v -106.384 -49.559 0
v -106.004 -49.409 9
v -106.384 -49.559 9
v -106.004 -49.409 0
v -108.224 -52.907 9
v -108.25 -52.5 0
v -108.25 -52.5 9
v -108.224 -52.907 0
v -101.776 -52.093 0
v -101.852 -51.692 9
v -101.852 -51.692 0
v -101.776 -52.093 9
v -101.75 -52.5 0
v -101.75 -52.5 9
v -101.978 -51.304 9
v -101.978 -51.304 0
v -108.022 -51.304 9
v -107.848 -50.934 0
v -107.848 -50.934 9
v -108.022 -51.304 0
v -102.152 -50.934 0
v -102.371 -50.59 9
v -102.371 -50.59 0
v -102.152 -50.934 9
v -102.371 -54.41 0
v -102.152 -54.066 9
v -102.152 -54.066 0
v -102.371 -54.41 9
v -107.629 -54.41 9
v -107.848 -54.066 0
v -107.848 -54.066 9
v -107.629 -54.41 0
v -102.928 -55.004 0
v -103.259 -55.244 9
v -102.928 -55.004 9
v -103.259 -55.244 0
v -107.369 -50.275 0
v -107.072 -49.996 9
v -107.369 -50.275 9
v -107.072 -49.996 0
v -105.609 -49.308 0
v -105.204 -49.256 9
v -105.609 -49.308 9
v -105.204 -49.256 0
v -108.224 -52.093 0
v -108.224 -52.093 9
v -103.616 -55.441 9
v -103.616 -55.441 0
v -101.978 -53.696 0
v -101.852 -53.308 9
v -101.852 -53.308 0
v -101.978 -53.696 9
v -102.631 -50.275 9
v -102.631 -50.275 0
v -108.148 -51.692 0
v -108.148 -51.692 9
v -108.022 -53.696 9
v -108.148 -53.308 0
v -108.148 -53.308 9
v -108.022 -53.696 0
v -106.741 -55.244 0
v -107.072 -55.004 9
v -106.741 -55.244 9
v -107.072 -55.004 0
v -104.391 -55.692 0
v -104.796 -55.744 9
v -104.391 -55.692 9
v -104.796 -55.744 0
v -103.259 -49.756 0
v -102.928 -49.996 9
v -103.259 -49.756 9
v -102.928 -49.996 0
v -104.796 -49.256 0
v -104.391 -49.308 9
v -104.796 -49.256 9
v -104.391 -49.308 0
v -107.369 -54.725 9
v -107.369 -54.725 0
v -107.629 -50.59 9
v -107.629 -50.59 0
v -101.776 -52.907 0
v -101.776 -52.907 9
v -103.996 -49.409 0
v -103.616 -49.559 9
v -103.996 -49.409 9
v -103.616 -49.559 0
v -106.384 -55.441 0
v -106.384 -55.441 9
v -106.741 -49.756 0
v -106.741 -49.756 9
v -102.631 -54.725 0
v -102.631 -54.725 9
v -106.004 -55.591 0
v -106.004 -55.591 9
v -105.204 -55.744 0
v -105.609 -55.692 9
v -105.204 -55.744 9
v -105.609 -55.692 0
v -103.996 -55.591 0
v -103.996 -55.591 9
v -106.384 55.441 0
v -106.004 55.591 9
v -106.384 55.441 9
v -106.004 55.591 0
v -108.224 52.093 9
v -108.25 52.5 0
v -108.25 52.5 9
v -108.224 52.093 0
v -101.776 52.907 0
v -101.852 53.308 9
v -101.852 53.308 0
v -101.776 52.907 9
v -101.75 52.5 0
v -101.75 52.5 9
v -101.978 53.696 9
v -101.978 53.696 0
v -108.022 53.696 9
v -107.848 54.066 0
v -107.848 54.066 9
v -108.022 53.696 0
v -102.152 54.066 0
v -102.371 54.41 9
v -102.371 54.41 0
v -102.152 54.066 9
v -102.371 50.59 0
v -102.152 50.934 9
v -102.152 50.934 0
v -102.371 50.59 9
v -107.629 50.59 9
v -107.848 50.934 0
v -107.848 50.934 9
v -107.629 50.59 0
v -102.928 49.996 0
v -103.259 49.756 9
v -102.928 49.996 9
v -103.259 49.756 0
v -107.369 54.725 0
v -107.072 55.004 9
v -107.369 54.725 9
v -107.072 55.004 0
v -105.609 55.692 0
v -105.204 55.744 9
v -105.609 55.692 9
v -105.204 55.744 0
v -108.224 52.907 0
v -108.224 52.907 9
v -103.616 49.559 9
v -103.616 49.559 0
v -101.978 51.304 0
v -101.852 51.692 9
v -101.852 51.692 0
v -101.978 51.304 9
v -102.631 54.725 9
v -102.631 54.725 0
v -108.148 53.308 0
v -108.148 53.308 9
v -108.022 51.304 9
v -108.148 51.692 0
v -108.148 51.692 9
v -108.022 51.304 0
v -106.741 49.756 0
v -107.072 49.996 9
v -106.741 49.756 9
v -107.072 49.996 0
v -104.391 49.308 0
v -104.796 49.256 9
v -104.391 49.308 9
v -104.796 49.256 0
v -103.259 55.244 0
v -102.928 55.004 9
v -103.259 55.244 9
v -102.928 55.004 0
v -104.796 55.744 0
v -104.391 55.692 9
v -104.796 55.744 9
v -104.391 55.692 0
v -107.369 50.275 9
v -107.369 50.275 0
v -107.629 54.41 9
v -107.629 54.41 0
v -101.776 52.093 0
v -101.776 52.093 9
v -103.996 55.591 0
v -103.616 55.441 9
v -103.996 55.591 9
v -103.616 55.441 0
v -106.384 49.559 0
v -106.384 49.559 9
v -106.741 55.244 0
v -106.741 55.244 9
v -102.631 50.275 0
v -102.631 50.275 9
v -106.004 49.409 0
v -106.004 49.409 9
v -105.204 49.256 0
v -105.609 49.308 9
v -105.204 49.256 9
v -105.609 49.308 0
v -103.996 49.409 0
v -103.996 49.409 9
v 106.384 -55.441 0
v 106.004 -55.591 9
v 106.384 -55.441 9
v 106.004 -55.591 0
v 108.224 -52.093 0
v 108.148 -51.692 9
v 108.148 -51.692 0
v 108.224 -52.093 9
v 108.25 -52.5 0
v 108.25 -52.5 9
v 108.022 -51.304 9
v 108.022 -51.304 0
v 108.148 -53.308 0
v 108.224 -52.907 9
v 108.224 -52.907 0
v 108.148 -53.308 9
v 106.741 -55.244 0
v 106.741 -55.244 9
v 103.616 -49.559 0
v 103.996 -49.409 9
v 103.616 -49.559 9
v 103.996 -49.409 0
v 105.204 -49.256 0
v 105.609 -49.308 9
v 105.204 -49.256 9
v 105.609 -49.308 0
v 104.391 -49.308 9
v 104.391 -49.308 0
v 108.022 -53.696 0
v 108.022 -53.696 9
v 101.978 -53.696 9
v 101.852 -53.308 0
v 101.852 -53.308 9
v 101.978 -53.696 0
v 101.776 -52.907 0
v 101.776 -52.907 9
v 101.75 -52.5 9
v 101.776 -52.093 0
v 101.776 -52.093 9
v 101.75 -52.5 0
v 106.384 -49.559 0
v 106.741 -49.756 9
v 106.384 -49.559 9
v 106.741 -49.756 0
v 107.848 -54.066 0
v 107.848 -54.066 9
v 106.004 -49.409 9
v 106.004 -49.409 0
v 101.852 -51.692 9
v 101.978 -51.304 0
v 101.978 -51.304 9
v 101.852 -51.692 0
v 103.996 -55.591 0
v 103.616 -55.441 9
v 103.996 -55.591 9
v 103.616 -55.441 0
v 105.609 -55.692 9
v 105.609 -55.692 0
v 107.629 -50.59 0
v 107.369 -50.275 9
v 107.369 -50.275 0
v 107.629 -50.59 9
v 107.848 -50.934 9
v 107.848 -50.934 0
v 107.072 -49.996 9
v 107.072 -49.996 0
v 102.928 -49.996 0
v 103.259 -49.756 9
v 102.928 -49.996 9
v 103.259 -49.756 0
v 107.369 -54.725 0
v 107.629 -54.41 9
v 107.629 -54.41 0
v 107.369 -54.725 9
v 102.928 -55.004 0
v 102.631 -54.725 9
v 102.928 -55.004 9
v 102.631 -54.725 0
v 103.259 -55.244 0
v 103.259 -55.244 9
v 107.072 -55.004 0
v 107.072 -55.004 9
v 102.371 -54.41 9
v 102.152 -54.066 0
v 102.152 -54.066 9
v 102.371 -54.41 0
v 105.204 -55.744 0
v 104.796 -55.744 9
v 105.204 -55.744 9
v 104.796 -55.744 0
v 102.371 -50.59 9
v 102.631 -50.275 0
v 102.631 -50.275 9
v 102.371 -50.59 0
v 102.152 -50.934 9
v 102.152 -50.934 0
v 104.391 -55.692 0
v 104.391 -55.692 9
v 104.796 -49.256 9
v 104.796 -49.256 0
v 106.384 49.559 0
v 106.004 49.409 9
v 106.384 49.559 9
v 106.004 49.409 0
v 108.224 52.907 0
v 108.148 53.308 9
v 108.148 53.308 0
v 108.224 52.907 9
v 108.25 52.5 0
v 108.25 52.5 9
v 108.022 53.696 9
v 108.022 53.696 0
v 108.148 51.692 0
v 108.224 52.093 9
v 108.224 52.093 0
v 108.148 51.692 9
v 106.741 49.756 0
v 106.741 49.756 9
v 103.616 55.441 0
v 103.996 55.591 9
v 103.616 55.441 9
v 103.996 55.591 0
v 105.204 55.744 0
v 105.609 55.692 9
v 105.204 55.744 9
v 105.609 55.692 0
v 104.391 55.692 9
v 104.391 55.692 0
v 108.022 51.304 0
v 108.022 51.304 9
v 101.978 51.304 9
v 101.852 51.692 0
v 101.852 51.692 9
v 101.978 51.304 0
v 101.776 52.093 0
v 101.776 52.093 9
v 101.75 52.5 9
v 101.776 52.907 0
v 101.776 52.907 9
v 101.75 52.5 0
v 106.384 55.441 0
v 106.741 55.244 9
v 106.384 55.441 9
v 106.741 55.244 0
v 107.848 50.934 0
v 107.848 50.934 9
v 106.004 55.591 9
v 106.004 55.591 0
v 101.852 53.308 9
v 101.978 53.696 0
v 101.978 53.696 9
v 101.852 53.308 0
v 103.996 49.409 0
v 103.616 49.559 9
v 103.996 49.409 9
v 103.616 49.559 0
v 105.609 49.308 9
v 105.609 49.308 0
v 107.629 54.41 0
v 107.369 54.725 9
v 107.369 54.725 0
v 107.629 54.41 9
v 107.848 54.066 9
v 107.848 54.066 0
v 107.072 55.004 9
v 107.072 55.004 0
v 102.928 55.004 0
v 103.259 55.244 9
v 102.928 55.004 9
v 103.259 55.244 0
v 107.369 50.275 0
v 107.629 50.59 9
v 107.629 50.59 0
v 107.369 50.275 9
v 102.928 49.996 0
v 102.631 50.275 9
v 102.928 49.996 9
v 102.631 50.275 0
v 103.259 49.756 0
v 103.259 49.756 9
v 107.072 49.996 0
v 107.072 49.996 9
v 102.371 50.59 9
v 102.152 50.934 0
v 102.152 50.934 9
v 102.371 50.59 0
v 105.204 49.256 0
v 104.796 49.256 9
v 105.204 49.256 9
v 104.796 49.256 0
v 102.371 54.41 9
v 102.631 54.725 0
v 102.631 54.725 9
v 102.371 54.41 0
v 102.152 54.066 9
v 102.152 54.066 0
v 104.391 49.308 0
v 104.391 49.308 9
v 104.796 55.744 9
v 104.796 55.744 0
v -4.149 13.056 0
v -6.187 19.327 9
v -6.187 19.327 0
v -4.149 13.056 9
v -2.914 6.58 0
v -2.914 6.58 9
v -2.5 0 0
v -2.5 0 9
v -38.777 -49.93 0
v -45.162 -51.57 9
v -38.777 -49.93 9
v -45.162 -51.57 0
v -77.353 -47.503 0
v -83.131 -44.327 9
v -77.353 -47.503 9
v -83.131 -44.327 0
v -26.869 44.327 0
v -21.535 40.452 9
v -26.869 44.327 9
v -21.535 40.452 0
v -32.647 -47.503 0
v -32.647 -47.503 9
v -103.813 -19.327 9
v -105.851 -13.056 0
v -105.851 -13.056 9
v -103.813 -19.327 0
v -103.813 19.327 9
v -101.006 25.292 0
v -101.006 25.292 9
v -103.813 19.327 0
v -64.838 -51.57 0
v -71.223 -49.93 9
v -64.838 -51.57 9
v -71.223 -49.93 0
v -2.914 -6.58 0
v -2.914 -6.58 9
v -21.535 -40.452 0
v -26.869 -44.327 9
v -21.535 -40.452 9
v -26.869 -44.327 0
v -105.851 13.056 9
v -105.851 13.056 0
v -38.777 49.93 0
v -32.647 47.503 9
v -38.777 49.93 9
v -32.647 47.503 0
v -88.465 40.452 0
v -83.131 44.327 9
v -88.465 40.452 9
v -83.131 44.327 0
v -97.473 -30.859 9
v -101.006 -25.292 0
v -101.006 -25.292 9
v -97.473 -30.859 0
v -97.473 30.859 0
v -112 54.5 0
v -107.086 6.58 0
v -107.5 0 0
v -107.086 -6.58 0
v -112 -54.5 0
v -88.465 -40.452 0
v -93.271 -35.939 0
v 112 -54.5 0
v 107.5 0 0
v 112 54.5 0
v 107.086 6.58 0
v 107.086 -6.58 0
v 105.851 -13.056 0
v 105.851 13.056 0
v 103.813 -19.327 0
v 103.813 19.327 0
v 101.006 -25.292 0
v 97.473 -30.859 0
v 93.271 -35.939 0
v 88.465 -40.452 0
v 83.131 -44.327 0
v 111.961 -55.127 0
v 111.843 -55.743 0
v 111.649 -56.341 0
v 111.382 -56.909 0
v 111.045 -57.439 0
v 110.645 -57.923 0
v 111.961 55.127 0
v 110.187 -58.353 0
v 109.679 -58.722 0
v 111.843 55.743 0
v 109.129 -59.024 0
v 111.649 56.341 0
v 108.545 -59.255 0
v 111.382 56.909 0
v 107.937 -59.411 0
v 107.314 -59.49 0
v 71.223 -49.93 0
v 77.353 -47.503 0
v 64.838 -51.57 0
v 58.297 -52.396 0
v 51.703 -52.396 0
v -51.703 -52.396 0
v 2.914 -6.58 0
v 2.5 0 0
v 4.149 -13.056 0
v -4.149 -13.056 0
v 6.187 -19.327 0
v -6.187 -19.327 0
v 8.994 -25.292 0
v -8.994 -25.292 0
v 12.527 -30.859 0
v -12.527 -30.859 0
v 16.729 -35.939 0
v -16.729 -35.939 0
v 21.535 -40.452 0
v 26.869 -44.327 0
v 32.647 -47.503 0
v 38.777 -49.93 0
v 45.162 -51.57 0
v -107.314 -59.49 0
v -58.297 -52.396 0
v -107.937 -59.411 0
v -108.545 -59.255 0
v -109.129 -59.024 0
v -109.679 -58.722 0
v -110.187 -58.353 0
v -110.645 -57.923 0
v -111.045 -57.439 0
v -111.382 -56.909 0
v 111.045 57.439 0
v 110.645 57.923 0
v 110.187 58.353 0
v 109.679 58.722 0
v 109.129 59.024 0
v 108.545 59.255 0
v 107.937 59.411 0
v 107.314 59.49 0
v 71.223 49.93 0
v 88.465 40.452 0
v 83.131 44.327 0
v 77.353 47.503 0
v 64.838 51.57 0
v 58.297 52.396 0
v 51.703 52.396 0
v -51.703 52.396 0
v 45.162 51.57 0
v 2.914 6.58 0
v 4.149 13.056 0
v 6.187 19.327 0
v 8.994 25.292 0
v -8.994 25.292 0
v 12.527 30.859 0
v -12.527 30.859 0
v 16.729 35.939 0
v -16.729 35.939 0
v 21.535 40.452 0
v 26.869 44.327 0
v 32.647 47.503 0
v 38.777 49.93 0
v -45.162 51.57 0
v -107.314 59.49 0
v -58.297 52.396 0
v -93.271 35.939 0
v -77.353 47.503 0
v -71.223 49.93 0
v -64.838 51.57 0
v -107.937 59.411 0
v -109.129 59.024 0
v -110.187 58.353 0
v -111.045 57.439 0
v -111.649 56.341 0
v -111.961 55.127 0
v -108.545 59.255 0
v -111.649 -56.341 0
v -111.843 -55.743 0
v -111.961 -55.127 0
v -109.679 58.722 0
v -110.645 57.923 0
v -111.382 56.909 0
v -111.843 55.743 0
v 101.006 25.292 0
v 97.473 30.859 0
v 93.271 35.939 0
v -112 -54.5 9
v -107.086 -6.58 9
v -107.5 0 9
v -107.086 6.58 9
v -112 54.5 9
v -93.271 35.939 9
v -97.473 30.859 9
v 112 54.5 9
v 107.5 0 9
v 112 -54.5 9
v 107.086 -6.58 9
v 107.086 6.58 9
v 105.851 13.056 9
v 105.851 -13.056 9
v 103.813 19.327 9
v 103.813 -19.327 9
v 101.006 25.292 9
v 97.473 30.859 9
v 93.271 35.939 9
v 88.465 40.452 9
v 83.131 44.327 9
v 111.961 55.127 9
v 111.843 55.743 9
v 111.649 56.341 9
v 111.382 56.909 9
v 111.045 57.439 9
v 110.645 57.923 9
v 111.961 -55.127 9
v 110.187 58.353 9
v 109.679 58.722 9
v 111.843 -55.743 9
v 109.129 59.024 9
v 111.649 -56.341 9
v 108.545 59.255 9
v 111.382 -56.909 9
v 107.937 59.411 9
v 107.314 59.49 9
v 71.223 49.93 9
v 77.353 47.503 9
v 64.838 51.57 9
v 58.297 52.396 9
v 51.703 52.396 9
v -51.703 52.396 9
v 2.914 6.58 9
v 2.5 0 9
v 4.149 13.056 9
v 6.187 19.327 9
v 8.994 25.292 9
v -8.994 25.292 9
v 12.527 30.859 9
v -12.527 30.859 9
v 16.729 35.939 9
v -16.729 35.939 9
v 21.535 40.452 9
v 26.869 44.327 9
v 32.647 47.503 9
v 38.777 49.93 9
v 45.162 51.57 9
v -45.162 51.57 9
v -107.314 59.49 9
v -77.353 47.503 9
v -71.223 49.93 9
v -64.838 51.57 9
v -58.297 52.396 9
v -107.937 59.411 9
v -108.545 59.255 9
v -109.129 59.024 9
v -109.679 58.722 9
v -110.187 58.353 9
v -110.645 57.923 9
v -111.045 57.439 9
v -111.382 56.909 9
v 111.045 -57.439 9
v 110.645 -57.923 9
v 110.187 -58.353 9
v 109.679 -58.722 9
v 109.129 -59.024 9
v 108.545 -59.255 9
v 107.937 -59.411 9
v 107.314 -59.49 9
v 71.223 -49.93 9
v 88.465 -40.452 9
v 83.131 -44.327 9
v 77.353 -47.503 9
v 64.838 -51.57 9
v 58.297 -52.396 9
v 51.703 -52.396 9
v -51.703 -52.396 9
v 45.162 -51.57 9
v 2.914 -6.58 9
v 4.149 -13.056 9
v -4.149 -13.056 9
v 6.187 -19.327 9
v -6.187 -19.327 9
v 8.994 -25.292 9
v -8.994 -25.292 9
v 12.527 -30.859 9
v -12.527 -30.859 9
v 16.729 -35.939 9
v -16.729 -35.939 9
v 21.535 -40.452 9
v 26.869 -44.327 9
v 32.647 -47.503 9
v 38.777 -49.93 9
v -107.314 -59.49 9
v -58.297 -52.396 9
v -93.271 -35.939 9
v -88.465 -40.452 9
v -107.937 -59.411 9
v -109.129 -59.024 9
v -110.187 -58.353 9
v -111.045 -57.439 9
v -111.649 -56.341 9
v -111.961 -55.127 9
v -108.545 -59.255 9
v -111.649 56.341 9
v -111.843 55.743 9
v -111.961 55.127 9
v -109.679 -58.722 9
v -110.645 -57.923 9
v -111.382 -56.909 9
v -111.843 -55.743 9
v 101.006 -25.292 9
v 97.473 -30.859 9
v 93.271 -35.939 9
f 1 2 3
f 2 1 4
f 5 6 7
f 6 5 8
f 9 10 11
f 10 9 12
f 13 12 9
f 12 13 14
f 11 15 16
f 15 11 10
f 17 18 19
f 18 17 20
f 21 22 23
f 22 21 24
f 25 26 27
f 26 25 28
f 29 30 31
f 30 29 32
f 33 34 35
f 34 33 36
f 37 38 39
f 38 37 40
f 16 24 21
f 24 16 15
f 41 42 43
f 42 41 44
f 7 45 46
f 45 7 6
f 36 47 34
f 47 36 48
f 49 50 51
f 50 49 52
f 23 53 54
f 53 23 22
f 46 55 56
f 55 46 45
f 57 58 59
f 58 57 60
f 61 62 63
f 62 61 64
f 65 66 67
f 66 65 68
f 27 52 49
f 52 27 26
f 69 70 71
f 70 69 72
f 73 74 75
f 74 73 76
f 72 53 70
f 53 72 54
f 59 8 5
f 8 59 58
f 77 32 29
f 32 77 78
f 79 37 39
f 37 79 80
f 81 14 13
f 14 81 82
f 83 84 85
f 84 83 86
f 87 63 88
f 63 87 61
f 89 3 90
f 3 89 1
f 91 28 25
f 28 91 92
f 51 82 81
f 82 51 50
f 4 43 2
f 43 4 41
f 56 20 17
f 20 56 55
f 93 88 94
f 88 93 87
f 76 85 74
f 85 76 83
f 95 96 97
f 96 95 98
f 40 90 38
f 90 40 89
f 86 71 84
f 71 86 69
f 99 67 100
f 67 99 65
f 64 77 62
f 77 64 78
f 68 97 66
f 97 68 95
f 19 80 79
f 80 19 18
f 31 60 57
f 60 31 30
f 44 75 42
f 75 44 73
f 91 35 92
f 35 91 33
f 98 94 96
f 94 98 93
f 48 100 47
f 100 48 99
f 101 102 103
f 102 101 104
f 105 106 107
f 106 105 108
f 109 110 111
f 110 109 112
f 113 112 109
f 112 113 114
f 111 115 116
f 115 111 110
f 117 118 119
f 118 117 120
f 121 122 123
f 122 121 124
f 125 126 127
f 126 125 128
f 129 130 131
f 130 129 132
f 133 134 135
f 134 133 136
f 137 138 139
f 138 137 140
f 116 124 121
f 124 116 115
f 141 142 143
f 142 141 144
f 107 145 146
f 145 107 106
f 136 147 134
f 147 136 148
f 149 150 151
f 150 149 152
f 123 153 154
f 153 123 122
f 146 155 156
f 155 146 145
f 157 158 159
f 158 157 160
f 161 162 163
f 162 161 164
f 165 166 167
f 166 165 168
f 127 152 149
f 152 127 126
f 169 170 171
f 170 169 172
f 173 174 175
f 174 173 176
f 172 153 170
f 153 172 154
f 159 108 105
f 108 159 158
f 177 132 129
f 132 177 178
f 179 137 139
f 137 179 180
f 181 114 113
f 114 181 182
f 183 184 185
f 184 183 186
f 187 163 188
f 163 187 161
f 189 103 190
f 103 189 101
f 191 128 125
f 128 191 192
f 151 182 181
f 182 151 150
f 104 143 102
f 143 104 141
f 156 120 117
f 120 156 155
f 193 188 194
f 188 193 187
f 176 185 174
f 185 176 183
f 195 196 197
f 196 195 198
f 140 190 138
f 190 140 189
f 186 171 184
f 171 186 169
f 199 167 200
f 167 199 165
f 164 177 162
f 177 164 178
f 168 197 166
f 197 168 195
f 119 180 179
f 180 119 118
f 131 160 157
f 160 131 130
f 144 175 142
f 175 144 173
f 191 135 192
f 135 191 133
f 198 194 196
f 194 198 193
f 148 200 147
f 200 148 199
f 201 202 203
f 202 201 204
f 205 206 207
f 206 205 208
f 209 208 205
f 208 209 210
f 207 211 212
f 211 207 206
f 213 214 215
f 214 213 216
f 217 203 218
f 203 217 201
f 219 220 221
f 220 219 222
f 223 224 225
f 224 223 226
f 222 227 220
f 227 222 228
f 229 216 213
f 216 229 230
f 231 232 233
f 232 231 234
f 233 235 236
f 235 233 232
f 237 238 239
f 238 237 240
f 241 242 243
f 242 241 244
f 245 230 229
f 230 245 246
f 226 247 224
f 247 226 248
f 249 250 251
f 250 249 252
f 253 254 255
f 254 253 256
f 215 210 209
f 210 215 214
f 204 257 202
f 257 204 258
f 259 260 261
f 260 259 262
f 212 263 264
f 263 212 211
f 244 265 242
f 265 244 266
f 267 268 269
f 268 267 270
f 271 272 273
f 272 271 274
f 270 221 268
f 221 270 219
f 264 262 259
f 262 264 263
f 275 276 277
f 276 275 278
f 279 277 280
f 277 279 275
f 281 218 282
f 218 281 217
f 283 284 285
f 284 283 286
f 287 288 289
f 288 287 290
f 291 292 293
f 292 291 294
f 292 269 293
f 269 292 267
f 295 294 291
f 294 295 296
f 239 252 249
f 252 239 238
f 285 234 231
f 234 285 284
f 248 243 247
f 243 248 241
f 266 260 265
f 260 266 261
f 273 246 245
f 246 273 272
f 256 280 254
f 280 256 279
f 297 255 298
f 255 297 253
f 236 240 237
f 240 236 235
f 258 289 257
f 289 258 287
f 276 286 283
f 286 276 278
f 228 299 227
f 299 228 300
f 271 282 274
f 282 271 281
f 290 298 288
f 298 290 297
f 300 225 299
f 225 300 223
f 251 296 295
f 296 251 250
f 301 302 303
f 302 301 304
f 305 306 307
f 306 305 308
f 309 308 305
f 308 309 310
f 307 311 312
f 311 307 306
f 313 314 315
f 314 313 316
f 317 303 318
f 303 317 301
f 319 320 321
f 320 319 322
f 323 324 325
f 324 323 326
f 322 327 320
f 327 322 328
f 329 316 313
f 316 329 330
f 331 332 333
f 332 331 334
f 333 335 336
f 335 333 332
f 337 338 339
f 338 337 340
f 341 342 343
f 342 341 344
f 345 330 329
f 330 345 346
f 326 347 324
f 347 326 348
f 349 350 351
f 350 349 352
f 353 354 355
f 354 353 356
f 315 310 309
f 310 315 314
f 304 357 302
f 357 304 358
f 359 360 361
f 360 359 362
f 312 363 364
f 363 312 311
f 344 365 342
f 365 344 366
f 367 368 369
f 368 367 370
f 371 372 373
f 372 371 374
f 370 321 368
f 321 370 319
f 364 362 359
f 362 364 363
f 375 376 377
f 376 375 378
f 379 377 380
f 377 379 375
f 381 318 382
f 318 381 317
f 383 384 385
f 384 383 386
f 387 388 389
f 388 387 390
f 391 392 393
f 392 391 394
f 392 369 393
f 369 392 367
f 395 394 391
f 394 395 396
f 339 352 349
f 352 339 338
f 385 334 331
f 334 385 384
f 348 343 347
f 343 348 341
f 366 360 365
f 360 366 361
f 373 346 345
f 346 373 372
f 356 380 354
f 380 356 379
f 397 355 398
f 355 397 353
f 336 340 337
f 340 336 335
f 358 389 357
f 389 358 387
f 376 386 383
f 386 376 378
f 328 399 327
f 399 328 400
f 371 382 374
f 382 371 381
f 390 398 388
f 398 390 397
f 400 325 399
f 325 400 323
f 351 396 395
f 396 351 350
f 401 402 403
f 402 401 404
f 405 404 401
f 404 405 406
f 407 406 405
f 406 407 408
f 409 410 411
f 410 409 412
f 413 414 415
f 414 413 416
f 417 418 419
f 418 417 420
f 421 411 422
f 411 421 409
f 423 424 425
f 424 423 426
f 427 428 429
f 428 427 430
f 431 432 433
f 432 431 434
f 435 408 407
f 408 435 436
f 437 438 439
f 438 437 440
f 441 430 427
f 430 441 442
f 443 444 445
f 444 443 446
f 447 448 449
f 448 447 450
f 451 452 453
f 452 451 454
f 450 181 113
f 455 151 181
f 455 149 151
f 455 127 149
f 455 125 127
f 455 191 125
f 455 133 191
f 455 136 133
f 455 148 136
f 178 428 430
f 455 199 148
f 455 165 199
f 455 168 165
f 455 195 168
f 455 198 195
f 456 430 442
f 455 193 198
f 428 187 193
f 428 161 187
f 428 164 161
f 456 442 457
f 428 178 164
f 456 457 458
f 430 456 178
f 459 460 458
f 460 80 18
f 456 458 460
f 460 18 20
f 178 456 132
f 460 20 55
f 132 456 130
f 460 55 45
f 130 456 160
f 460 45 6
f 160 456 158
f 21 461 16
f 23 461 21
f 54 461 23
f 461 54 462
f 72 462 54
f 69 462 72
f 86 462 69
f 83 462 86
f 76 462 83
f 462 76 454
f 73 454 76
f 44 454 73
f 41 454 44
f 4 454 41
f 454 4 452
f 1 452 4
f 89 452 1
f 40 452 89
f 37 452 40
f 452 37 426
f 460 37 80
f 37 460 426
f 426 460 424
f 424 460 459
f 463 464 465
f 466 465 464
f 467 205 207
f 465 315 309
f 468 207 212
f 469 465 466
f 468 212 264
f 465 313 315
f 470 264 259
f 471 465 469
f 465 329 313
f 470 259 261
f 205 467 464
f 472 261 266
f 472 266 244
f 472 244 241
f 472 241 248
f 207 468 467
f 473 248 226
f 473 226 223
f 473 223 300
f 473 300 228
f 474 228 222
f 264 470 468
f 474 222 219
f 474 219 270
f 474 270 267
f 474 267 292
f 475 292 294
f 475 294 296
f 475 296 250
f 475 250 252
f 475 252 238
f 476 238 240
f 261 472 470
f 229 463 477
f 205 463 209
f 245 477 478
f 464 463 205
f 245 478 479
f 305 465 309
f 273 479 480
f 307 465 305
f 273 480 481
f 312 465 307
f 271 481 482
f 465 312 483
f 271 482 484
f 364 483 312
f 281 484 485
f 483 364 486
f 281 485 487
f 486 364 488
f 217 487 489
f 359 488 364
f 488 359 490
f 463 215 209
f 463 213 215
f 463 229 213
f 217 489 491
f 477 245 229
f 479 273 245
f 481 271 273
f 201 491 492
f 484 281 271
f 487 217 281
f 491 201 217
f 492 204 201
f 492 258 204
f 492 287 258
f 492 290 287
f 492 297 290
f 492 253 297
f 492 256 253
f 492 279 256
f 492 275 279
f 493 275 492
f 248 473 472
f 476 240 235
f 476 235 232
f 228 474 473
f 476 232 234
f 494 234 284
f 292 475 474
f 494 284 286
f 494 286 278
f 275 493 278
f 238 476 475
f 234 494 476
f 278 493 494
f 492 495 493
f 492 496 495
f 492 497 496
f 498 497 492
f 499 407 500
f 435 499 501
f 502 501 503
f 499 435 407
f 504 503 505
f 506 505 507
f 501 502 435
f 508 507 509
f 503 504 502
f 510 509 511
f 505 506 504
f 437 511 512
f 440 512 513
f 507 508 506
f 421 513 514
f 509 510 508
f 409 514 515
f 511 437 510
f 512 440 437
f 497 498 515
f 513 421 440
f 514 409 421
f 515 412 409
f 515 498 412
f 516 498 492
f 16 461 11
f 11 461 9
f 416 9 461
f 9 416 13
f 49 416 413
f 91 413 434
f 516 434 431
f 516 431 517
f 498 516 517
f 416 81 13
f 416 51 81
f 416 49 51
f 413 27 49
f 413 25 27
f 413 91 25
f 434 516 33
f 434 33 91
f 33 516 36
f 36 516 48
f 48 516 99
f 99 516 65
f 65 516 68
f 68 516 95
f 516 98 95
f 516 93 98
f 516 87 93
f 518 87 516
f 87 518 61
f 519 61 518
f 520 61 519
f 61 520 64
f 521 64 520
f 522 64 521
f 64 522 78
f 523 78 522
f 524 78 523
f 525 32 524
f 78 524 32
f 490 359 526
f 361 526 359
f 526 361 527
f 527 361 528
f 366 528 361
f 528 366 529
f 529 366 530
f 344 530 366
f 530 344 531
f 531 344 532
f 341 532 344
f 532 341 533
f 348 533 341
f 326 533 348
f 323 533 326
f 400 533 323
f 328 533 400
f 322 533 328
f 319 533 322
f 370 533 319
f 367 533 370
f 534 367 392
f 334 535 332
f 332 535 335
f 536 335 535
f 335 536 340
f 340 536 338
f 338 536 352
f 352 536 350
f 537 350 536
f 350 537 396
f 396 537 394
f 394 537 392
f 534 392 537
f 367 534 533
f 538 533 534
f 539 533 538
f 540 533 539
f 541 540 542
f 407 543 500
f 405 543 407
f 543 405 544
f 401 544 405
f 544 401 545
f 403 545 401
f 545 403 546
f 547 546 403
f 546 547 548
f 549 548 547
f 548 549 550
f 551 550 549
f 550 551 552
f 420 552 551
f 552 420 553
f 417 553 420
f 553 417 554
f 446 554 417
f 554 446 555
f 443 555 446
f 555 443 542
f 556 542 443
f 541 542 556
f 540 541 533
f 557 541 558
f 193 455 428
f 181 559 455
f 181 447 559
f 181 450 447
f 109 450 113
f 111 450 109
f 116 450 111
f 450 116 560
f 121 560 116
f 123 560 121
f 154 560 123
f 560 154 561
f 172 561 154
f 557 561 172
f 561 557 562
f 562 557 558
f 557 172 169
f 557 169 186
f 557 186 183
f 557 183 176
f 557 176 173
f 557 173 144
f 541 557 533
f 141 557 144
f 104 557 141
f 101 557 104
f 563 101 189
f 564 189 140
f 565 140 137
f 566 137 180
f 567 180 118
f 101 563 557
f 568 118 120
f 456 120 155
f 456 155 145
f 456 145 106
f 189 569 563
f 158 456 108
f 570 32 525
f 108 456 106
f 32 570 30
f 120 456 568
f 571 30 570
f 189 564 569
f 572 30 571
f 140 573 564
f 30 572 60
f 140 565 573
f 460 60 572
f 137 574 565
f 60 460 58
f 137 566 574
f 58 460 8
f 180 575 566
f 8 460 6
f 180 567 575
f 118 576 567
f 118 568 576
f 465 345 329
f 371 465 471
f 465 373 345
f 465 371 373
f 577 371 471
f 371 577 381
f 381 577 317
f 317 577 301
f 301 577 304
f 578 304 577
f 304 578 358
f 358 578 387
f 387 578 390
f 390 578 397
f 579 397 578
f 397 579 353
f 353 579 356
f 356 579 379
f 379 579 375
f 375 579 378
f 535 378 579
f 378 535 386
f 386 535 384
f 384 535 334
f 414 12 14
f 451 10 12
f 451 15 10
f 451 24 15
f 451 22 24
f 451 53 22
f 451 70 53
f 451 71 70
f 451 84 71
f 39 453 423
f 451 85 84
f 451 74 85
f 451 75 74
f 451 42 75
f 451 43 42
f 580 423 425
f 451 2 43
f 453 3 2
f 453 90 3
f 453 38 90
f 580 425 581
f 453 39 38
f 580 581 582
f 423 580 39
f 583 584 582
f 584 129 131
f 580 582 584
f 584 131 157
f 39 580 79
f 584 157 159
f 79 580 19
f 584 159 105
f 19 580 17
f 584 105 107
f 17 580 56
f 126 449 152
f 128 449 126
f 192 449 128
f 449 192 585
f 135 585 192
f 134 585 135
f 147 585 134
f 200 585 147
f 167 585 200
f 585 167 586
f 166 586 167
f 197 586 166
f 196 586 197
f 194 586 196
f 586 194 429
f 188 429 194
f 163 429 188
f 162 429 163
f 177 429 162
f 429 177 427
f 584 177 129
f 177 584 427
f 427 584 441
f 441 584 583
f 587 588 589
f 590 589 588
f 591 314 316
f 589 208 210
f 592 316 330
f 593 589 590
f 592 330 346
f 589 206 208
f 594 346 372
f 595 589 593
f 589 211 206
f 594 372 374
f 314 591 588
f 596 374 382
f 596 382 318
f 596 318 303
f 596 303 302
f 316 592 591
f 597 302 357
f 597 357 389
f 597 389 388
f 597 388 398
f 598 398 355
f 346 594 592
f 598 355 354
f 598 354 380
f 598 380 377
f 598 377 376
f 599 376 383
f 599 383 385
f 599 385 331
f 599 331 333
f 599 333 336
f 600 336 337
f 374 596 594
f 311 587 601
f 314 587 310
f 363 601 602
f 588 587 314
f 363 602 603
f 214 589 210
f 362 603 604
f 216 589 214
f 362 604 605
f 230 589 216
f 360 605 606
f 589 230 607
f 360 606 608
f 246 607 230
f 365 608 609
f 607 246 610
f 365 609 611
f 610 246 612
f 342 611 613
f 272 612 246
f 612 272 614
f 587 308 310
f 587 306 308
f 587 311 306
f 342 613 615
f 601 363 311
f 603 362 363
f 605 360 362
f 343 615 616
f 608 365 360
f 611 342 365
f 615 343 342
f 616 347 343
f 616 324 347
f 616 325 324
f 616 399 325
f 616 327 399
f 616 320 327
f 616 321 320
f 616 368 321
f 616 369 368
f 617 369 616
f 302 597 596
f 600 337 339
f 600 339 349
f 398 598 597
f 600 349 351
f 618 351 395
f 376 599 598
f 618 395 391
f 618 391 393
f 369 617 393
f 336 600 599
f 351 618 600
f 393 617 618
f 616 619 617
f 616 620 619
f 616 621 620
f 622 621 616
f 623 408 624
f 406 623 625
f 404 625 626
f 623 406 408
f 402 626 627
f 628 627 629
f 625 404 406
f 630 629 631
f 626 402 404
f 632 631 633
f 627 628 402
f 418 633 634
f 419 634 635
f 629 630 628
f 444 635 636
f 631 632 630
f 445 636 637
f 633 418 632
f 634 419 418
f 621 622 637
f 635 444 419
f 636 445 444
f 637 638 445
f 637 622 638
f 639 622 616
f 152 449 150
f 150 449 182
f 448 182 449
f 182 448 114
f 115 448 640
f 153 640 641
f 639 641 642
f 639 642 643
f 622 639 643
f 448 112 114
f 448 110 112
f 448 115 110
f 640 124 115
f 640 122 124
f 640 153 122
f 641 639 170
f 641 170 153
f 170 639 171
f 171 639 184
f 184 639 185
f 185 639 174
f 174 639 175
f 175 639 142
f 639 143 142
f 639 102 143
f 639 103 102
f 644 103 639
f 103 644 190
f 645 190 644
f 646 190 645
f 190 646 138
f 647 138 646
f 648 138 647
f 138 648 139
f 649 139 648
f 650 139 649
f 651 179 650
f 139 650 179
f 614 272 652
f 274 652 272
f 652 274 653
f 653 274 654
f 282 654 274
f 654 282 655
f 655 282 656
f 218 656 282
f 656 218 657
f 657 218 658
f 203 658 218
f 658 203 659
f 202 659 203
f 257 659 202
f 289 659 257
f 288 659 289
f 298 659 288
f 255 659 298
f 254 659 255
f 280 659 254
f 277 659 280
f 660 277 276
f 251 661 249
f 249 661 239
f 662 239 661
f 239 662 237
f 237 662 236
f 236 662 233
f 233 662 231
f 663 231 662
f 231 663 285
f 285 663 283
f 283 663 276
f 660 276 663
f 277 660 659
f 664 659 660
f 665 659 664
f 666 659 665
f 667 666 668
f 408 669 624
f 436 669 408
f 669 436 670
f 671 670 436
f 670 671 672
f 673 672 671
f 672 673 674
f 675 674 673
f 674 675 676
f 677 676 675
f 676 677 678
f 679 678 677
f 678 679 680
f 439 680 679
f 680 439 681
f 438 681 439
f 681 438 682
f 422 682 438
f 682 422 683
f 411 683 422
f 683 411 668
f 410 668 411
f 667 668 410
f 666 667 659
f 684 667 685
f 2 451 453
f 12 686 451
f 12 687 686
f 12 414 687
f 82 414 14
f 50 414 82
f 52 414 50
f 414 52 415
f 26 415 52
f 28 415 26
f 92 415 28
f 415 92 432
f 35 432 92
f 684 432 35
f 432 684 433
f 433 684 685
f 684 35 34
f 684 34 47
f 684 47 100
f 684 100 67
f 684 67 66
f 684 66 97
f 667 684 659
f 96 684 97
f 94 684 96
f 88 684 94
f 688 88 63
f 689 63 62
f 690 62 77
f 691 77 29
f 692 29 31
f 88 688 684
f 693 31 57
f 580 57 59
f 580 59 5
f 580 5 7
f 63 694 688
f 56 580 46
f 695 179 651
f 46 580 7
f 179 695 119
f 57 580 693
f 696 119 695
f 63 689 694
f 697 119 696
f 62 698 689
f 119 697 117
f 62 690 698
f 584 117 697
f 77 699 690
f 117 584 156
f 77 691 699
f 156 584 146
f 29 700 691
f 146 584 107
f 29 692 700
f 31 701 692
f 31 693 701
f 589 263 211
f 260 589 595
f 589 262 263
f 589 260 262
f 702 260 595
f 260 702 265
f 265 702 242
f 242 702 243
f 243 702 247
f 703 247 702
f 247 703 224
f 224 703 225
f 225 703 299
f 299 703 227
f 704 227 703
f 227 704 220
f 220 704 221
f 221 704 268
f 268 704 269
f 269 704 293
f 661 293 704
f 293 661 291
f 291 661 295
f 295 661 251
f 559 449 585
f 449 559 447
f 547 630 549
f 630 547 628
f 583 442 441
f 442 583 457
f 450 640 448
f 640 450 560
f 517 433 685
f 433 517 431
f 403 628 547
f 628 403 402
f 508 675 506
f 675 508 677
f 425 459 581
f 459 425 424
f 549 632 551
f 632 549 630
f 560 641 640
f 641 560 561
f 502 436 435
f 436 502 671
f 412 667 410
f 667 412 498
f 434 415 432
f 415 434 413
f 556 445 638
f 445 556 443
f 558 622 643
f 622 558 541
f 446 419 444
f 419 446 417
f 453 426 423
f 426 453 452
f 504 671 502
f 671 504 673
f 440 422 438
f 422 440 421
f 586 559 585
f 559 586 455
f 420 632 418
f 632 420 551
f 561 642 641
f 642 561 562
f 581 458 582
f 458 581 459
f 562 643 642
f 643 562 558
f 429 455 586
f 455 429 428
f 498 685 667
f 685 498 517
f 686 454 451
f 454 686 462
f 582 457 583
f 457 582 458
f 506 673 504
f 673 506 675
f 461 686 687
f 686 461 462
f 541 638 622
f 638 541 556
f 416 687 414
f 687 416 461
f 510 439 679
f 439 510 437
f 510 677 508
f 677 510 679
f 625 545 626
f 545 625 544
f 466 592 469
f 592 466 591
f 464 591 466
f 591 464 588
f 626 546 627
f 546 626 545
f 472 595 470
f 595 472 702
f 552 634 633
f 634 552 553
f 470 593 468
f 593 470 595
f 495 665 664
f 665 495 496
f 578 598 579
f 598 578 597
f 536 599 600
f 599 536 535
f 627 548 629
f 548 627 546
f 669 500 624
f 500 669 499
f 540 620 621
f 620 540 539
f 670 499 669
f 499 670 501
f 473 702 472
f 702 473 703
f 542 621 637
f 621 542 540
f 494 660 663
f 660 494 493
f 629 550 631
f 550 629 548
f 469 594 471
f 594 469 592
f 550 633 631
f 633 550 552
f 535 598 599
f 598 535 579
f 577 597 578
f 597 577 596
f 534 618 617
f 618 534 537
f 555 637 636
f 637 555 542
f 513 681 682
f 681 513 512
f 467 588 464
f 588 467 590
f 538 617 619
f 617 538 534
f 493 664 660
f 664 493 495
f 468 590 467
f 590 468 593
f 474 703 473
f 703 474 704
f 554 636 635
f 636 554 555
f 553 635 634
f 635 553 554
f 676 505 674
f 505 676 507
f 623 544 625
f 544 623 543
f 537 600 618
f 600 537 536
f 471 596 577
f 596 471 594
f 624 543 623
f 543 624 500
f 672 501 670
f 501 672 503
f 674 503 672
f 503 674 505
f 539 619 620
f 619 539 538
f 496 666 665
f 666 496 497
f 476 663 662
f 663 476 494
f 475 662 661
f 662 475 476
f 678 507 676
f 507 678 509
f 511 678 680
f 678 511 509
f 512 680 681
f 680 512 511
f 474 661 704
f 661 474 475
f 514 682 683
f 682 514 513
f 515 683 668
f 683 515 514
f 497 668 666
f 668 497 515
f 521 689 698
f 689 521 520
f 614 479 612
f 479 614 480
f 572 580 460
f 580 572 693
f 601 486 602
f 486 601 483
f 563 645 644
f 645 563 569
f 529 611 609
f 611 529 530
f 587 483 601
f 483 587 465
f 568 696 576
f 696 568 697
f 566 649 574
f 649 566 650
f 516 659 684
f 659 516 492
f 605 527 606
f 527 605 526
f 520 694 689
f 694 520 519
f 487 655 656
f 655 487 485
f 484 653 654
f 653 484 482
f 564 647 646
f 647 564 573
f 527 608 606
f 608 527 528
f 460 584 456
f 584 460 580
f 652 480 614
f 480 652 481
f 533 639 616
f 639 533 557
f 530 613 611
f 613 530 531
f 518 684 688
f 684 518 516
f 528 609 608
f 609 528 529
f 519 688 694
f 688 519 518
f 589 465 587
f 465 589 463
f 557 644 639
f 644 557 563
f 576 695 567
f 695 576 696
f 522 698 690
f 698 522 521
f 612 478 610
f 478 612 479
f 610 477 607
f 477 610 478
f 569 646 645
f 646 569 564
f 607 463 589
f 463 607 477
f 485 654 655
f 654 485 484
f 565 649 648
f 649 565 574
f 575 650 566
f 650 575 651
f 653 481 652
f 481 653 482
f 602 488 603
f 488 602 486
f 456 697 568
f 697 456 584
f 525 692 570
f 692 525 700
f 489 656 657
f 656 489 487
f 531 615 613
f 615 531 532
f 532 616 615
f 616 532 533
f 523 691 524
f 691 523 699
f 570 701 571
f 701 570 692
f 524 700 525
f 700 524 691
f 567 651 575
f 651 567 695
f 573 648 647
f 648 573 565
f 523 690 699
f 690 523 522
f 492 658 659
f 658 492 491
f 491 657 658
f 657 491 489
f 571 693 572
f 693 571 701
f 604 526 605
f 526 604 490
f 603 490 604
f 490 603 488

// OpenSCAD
$fn = 50;


difference() {
	union() {
		hull() {
			translate(v = [-107.0000000000, 54.5000000000, 0]) {
				cylinder(h = 9, r = 5);
			}
			translate(v = [107.0000000000, 54.5000000000, 0]) {
				cylinder(h = 9, r = 5);
			}
			translate(v = [-107.0000000000, -54.5000000000, 0]) {
				cylinder(h = 9, r = 5);
			}
			translate(v = [107.0000000000, -54.5000000000, 0]) {
				cylinder(h = 9, r = 5);
			}
		}
	}
	union() {
		#translate(v = [-105.0000000000, -52.5000000000, -100.0000000000]) {
			cylinder(h = 200, r = 3.2500000000);
		}
		#translate(v = [-105.0000000000, 52.5000000000, -100.0000000000]) {
			cylinder(h = 200, r = 3.2500000000);
		}
		#translate(v = [105.0000000000, -52.5000000000, -100.0000000000]) {
			cylinder(h = 200, r = 3.2500000000);
		}
		#translate(v = [105.0000000000, 52.5000000000, -100.0000000000]) {
			cylinder(h = 200, r = 3.2500000000);
		}
		#translate(v = [-55.0000000000, 0, 0]) {
			cylinder(h = 9, r = 52.5000000000);
		}
		#translate(v = [55.0000000000, 0, 0]) {
			cylinder(h = 9, r = 52.5000000000);
		}
	}
}
